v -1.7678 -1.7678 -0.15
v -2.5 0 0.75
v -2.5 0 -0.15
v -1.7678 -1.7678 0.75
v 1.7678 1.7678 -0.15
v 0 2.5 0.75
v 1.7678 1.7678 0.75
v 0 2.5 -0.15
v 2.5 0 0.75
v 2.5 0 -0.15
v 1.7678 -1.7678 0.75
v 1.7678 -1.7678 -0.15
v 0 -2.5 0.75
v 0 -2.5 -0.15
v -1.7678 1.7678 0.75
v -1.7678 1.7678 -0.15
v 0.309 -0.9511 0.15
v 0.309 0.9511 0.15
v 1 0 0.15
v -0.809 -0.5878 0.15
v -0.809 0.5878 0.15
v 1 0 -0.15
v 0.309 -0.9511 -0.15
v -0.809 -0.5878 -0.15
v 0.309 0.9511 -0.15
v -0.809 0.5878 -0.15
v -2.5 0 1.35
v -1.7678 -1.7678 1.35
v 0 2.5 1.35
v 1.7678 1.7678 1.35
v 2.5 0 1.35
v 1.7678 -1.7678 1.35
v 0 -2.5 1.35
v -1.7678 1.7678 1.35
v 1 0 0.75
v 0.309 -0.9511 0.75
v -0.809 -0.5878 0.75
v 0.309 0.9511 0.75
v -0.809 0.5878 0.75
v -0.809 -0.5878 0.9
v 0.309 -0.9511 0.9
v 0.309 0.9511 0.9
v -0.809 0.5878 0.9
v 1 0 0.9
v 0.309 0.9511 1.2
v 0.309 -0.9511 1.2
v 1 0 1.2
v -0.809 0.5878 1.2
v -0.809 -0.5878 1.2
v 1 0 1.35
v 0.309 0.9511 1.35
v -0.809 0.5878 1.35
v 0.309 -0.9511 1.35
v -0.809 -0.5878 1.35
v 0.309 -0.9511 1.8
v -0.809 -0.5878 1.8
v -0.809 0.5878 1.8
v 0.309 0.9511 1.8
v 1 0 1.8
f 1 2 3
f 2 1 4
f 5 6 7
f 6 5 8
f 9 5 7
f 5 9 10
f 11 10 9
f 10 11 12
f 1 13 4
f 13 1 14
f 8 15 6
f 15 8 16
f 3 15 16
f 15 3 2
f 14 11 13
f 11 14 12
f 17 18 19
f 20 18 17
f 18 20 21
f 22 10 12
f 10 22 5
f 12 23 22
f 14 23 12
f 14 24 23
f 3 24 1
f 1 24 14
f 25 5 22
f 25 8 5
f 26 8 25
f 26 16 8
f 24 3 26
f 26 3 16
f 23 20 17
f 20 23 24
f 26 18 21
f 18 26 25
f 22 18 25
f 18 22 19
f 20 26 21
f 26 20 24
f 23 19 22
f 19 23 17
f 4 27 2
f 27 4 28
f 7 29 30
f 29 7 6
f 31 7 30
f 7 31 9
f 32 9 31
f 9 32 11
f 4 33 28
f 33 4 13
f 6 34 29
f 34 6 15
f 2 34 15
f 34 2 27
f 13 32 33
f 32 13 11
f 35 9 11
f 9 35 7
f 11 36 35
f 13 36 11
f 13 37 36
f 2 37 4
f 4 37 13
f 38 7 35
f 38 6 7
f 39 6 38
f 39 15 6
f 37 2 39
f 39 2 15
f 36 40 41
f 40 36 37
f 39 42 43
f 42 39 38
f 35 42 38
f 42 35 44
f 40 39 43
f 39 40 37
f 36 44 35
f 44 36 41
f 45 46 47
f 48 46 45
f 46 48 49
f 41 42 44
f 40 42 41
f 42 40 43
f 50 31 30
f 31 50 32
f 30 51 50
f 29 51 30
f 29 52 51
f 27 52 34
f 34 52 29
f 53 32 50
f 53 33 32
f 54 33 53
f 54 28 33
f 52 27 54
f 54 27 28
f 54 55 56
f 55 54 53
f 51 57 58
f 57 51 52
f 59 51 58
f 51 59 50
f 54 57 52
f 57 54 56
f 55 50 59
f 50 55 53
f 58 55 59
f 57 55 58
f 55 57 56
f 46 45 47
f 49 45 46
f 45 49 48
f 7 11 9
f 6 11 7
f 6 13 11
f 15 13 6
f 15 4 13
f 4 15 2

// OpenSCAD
// Parameters
inner_diameter_mm = 2; //[1:4:0.1]
outer_diameter_mm = 5; //[2.5:10:0.1]
thickness_mm = 0.3; //[0.15:0.6:0.05]
inner_radius_mm = 1; //[0.5:2:0.05]
outer_radius_mm = 2.5; //[1.25:5:0.05]
eps_mm = 0.2; //[0.05:0.5:0.05]

// Washer - base geometry
module washer_solid() {
  color("Silver") difference() {
    // Washer body
    cylinder(r=outer_diameter_mm/2, h=thickness_mm, center=true);
    // Center through hole
    cylinder(r=inner_diameter_mm/2, h=thickness_mm + eps_mm, center=true);
  }
}

// Round Grommet Top - detailed geometry
module round_grommet_top() {
  color("DimGray") {
    // Grommet top body
    cylinder(r=outer_diameter_mm/2, h=thickness_mm, center=true);
  }
}

// Round Grommet Assembly - detailed geometry
module round_grommet_assembly() {
  color("DimGray") {
    // Grommet assembly body
    cylinder(r=outer_diameter_mm/2, h=thickness_mm, center=true);
  }
}

// Nut And Washer - detailed geometry
module nut_and_washer() {
  color("Black") {
    // Nut body
    translate([0, 0, thickness_mm/2])
      cylinder(r=outer_diameter_mm/2, h=thickness_mm, center=true);
    // Washer
    washer_solid();
  }
}

// Screw And Washer - detailed geometry
module screw_and_washer() {
  color("Black") {
    // Screw body
    translate([0, 0, thickness_mm])
      cylinder(r=inner_diameter_mm/2, h=thickness_mm*2, center=true);
    // Washer
    washer_solid();
  }
}

// Assembly
module assembly() {
  translate([0, 0, 0]) washer_solid();
  translate([0, 0, thickness_mm]) round_grommet_top();
  translate([0, 0, thickness_mm*2]) round_grommet_assembly();
  translate([0, 0, thickness_mm*3]) nut_and_washer();
  translate([0, 0, thickness_mm*4]) screw_and_washer();
}

assembly();
